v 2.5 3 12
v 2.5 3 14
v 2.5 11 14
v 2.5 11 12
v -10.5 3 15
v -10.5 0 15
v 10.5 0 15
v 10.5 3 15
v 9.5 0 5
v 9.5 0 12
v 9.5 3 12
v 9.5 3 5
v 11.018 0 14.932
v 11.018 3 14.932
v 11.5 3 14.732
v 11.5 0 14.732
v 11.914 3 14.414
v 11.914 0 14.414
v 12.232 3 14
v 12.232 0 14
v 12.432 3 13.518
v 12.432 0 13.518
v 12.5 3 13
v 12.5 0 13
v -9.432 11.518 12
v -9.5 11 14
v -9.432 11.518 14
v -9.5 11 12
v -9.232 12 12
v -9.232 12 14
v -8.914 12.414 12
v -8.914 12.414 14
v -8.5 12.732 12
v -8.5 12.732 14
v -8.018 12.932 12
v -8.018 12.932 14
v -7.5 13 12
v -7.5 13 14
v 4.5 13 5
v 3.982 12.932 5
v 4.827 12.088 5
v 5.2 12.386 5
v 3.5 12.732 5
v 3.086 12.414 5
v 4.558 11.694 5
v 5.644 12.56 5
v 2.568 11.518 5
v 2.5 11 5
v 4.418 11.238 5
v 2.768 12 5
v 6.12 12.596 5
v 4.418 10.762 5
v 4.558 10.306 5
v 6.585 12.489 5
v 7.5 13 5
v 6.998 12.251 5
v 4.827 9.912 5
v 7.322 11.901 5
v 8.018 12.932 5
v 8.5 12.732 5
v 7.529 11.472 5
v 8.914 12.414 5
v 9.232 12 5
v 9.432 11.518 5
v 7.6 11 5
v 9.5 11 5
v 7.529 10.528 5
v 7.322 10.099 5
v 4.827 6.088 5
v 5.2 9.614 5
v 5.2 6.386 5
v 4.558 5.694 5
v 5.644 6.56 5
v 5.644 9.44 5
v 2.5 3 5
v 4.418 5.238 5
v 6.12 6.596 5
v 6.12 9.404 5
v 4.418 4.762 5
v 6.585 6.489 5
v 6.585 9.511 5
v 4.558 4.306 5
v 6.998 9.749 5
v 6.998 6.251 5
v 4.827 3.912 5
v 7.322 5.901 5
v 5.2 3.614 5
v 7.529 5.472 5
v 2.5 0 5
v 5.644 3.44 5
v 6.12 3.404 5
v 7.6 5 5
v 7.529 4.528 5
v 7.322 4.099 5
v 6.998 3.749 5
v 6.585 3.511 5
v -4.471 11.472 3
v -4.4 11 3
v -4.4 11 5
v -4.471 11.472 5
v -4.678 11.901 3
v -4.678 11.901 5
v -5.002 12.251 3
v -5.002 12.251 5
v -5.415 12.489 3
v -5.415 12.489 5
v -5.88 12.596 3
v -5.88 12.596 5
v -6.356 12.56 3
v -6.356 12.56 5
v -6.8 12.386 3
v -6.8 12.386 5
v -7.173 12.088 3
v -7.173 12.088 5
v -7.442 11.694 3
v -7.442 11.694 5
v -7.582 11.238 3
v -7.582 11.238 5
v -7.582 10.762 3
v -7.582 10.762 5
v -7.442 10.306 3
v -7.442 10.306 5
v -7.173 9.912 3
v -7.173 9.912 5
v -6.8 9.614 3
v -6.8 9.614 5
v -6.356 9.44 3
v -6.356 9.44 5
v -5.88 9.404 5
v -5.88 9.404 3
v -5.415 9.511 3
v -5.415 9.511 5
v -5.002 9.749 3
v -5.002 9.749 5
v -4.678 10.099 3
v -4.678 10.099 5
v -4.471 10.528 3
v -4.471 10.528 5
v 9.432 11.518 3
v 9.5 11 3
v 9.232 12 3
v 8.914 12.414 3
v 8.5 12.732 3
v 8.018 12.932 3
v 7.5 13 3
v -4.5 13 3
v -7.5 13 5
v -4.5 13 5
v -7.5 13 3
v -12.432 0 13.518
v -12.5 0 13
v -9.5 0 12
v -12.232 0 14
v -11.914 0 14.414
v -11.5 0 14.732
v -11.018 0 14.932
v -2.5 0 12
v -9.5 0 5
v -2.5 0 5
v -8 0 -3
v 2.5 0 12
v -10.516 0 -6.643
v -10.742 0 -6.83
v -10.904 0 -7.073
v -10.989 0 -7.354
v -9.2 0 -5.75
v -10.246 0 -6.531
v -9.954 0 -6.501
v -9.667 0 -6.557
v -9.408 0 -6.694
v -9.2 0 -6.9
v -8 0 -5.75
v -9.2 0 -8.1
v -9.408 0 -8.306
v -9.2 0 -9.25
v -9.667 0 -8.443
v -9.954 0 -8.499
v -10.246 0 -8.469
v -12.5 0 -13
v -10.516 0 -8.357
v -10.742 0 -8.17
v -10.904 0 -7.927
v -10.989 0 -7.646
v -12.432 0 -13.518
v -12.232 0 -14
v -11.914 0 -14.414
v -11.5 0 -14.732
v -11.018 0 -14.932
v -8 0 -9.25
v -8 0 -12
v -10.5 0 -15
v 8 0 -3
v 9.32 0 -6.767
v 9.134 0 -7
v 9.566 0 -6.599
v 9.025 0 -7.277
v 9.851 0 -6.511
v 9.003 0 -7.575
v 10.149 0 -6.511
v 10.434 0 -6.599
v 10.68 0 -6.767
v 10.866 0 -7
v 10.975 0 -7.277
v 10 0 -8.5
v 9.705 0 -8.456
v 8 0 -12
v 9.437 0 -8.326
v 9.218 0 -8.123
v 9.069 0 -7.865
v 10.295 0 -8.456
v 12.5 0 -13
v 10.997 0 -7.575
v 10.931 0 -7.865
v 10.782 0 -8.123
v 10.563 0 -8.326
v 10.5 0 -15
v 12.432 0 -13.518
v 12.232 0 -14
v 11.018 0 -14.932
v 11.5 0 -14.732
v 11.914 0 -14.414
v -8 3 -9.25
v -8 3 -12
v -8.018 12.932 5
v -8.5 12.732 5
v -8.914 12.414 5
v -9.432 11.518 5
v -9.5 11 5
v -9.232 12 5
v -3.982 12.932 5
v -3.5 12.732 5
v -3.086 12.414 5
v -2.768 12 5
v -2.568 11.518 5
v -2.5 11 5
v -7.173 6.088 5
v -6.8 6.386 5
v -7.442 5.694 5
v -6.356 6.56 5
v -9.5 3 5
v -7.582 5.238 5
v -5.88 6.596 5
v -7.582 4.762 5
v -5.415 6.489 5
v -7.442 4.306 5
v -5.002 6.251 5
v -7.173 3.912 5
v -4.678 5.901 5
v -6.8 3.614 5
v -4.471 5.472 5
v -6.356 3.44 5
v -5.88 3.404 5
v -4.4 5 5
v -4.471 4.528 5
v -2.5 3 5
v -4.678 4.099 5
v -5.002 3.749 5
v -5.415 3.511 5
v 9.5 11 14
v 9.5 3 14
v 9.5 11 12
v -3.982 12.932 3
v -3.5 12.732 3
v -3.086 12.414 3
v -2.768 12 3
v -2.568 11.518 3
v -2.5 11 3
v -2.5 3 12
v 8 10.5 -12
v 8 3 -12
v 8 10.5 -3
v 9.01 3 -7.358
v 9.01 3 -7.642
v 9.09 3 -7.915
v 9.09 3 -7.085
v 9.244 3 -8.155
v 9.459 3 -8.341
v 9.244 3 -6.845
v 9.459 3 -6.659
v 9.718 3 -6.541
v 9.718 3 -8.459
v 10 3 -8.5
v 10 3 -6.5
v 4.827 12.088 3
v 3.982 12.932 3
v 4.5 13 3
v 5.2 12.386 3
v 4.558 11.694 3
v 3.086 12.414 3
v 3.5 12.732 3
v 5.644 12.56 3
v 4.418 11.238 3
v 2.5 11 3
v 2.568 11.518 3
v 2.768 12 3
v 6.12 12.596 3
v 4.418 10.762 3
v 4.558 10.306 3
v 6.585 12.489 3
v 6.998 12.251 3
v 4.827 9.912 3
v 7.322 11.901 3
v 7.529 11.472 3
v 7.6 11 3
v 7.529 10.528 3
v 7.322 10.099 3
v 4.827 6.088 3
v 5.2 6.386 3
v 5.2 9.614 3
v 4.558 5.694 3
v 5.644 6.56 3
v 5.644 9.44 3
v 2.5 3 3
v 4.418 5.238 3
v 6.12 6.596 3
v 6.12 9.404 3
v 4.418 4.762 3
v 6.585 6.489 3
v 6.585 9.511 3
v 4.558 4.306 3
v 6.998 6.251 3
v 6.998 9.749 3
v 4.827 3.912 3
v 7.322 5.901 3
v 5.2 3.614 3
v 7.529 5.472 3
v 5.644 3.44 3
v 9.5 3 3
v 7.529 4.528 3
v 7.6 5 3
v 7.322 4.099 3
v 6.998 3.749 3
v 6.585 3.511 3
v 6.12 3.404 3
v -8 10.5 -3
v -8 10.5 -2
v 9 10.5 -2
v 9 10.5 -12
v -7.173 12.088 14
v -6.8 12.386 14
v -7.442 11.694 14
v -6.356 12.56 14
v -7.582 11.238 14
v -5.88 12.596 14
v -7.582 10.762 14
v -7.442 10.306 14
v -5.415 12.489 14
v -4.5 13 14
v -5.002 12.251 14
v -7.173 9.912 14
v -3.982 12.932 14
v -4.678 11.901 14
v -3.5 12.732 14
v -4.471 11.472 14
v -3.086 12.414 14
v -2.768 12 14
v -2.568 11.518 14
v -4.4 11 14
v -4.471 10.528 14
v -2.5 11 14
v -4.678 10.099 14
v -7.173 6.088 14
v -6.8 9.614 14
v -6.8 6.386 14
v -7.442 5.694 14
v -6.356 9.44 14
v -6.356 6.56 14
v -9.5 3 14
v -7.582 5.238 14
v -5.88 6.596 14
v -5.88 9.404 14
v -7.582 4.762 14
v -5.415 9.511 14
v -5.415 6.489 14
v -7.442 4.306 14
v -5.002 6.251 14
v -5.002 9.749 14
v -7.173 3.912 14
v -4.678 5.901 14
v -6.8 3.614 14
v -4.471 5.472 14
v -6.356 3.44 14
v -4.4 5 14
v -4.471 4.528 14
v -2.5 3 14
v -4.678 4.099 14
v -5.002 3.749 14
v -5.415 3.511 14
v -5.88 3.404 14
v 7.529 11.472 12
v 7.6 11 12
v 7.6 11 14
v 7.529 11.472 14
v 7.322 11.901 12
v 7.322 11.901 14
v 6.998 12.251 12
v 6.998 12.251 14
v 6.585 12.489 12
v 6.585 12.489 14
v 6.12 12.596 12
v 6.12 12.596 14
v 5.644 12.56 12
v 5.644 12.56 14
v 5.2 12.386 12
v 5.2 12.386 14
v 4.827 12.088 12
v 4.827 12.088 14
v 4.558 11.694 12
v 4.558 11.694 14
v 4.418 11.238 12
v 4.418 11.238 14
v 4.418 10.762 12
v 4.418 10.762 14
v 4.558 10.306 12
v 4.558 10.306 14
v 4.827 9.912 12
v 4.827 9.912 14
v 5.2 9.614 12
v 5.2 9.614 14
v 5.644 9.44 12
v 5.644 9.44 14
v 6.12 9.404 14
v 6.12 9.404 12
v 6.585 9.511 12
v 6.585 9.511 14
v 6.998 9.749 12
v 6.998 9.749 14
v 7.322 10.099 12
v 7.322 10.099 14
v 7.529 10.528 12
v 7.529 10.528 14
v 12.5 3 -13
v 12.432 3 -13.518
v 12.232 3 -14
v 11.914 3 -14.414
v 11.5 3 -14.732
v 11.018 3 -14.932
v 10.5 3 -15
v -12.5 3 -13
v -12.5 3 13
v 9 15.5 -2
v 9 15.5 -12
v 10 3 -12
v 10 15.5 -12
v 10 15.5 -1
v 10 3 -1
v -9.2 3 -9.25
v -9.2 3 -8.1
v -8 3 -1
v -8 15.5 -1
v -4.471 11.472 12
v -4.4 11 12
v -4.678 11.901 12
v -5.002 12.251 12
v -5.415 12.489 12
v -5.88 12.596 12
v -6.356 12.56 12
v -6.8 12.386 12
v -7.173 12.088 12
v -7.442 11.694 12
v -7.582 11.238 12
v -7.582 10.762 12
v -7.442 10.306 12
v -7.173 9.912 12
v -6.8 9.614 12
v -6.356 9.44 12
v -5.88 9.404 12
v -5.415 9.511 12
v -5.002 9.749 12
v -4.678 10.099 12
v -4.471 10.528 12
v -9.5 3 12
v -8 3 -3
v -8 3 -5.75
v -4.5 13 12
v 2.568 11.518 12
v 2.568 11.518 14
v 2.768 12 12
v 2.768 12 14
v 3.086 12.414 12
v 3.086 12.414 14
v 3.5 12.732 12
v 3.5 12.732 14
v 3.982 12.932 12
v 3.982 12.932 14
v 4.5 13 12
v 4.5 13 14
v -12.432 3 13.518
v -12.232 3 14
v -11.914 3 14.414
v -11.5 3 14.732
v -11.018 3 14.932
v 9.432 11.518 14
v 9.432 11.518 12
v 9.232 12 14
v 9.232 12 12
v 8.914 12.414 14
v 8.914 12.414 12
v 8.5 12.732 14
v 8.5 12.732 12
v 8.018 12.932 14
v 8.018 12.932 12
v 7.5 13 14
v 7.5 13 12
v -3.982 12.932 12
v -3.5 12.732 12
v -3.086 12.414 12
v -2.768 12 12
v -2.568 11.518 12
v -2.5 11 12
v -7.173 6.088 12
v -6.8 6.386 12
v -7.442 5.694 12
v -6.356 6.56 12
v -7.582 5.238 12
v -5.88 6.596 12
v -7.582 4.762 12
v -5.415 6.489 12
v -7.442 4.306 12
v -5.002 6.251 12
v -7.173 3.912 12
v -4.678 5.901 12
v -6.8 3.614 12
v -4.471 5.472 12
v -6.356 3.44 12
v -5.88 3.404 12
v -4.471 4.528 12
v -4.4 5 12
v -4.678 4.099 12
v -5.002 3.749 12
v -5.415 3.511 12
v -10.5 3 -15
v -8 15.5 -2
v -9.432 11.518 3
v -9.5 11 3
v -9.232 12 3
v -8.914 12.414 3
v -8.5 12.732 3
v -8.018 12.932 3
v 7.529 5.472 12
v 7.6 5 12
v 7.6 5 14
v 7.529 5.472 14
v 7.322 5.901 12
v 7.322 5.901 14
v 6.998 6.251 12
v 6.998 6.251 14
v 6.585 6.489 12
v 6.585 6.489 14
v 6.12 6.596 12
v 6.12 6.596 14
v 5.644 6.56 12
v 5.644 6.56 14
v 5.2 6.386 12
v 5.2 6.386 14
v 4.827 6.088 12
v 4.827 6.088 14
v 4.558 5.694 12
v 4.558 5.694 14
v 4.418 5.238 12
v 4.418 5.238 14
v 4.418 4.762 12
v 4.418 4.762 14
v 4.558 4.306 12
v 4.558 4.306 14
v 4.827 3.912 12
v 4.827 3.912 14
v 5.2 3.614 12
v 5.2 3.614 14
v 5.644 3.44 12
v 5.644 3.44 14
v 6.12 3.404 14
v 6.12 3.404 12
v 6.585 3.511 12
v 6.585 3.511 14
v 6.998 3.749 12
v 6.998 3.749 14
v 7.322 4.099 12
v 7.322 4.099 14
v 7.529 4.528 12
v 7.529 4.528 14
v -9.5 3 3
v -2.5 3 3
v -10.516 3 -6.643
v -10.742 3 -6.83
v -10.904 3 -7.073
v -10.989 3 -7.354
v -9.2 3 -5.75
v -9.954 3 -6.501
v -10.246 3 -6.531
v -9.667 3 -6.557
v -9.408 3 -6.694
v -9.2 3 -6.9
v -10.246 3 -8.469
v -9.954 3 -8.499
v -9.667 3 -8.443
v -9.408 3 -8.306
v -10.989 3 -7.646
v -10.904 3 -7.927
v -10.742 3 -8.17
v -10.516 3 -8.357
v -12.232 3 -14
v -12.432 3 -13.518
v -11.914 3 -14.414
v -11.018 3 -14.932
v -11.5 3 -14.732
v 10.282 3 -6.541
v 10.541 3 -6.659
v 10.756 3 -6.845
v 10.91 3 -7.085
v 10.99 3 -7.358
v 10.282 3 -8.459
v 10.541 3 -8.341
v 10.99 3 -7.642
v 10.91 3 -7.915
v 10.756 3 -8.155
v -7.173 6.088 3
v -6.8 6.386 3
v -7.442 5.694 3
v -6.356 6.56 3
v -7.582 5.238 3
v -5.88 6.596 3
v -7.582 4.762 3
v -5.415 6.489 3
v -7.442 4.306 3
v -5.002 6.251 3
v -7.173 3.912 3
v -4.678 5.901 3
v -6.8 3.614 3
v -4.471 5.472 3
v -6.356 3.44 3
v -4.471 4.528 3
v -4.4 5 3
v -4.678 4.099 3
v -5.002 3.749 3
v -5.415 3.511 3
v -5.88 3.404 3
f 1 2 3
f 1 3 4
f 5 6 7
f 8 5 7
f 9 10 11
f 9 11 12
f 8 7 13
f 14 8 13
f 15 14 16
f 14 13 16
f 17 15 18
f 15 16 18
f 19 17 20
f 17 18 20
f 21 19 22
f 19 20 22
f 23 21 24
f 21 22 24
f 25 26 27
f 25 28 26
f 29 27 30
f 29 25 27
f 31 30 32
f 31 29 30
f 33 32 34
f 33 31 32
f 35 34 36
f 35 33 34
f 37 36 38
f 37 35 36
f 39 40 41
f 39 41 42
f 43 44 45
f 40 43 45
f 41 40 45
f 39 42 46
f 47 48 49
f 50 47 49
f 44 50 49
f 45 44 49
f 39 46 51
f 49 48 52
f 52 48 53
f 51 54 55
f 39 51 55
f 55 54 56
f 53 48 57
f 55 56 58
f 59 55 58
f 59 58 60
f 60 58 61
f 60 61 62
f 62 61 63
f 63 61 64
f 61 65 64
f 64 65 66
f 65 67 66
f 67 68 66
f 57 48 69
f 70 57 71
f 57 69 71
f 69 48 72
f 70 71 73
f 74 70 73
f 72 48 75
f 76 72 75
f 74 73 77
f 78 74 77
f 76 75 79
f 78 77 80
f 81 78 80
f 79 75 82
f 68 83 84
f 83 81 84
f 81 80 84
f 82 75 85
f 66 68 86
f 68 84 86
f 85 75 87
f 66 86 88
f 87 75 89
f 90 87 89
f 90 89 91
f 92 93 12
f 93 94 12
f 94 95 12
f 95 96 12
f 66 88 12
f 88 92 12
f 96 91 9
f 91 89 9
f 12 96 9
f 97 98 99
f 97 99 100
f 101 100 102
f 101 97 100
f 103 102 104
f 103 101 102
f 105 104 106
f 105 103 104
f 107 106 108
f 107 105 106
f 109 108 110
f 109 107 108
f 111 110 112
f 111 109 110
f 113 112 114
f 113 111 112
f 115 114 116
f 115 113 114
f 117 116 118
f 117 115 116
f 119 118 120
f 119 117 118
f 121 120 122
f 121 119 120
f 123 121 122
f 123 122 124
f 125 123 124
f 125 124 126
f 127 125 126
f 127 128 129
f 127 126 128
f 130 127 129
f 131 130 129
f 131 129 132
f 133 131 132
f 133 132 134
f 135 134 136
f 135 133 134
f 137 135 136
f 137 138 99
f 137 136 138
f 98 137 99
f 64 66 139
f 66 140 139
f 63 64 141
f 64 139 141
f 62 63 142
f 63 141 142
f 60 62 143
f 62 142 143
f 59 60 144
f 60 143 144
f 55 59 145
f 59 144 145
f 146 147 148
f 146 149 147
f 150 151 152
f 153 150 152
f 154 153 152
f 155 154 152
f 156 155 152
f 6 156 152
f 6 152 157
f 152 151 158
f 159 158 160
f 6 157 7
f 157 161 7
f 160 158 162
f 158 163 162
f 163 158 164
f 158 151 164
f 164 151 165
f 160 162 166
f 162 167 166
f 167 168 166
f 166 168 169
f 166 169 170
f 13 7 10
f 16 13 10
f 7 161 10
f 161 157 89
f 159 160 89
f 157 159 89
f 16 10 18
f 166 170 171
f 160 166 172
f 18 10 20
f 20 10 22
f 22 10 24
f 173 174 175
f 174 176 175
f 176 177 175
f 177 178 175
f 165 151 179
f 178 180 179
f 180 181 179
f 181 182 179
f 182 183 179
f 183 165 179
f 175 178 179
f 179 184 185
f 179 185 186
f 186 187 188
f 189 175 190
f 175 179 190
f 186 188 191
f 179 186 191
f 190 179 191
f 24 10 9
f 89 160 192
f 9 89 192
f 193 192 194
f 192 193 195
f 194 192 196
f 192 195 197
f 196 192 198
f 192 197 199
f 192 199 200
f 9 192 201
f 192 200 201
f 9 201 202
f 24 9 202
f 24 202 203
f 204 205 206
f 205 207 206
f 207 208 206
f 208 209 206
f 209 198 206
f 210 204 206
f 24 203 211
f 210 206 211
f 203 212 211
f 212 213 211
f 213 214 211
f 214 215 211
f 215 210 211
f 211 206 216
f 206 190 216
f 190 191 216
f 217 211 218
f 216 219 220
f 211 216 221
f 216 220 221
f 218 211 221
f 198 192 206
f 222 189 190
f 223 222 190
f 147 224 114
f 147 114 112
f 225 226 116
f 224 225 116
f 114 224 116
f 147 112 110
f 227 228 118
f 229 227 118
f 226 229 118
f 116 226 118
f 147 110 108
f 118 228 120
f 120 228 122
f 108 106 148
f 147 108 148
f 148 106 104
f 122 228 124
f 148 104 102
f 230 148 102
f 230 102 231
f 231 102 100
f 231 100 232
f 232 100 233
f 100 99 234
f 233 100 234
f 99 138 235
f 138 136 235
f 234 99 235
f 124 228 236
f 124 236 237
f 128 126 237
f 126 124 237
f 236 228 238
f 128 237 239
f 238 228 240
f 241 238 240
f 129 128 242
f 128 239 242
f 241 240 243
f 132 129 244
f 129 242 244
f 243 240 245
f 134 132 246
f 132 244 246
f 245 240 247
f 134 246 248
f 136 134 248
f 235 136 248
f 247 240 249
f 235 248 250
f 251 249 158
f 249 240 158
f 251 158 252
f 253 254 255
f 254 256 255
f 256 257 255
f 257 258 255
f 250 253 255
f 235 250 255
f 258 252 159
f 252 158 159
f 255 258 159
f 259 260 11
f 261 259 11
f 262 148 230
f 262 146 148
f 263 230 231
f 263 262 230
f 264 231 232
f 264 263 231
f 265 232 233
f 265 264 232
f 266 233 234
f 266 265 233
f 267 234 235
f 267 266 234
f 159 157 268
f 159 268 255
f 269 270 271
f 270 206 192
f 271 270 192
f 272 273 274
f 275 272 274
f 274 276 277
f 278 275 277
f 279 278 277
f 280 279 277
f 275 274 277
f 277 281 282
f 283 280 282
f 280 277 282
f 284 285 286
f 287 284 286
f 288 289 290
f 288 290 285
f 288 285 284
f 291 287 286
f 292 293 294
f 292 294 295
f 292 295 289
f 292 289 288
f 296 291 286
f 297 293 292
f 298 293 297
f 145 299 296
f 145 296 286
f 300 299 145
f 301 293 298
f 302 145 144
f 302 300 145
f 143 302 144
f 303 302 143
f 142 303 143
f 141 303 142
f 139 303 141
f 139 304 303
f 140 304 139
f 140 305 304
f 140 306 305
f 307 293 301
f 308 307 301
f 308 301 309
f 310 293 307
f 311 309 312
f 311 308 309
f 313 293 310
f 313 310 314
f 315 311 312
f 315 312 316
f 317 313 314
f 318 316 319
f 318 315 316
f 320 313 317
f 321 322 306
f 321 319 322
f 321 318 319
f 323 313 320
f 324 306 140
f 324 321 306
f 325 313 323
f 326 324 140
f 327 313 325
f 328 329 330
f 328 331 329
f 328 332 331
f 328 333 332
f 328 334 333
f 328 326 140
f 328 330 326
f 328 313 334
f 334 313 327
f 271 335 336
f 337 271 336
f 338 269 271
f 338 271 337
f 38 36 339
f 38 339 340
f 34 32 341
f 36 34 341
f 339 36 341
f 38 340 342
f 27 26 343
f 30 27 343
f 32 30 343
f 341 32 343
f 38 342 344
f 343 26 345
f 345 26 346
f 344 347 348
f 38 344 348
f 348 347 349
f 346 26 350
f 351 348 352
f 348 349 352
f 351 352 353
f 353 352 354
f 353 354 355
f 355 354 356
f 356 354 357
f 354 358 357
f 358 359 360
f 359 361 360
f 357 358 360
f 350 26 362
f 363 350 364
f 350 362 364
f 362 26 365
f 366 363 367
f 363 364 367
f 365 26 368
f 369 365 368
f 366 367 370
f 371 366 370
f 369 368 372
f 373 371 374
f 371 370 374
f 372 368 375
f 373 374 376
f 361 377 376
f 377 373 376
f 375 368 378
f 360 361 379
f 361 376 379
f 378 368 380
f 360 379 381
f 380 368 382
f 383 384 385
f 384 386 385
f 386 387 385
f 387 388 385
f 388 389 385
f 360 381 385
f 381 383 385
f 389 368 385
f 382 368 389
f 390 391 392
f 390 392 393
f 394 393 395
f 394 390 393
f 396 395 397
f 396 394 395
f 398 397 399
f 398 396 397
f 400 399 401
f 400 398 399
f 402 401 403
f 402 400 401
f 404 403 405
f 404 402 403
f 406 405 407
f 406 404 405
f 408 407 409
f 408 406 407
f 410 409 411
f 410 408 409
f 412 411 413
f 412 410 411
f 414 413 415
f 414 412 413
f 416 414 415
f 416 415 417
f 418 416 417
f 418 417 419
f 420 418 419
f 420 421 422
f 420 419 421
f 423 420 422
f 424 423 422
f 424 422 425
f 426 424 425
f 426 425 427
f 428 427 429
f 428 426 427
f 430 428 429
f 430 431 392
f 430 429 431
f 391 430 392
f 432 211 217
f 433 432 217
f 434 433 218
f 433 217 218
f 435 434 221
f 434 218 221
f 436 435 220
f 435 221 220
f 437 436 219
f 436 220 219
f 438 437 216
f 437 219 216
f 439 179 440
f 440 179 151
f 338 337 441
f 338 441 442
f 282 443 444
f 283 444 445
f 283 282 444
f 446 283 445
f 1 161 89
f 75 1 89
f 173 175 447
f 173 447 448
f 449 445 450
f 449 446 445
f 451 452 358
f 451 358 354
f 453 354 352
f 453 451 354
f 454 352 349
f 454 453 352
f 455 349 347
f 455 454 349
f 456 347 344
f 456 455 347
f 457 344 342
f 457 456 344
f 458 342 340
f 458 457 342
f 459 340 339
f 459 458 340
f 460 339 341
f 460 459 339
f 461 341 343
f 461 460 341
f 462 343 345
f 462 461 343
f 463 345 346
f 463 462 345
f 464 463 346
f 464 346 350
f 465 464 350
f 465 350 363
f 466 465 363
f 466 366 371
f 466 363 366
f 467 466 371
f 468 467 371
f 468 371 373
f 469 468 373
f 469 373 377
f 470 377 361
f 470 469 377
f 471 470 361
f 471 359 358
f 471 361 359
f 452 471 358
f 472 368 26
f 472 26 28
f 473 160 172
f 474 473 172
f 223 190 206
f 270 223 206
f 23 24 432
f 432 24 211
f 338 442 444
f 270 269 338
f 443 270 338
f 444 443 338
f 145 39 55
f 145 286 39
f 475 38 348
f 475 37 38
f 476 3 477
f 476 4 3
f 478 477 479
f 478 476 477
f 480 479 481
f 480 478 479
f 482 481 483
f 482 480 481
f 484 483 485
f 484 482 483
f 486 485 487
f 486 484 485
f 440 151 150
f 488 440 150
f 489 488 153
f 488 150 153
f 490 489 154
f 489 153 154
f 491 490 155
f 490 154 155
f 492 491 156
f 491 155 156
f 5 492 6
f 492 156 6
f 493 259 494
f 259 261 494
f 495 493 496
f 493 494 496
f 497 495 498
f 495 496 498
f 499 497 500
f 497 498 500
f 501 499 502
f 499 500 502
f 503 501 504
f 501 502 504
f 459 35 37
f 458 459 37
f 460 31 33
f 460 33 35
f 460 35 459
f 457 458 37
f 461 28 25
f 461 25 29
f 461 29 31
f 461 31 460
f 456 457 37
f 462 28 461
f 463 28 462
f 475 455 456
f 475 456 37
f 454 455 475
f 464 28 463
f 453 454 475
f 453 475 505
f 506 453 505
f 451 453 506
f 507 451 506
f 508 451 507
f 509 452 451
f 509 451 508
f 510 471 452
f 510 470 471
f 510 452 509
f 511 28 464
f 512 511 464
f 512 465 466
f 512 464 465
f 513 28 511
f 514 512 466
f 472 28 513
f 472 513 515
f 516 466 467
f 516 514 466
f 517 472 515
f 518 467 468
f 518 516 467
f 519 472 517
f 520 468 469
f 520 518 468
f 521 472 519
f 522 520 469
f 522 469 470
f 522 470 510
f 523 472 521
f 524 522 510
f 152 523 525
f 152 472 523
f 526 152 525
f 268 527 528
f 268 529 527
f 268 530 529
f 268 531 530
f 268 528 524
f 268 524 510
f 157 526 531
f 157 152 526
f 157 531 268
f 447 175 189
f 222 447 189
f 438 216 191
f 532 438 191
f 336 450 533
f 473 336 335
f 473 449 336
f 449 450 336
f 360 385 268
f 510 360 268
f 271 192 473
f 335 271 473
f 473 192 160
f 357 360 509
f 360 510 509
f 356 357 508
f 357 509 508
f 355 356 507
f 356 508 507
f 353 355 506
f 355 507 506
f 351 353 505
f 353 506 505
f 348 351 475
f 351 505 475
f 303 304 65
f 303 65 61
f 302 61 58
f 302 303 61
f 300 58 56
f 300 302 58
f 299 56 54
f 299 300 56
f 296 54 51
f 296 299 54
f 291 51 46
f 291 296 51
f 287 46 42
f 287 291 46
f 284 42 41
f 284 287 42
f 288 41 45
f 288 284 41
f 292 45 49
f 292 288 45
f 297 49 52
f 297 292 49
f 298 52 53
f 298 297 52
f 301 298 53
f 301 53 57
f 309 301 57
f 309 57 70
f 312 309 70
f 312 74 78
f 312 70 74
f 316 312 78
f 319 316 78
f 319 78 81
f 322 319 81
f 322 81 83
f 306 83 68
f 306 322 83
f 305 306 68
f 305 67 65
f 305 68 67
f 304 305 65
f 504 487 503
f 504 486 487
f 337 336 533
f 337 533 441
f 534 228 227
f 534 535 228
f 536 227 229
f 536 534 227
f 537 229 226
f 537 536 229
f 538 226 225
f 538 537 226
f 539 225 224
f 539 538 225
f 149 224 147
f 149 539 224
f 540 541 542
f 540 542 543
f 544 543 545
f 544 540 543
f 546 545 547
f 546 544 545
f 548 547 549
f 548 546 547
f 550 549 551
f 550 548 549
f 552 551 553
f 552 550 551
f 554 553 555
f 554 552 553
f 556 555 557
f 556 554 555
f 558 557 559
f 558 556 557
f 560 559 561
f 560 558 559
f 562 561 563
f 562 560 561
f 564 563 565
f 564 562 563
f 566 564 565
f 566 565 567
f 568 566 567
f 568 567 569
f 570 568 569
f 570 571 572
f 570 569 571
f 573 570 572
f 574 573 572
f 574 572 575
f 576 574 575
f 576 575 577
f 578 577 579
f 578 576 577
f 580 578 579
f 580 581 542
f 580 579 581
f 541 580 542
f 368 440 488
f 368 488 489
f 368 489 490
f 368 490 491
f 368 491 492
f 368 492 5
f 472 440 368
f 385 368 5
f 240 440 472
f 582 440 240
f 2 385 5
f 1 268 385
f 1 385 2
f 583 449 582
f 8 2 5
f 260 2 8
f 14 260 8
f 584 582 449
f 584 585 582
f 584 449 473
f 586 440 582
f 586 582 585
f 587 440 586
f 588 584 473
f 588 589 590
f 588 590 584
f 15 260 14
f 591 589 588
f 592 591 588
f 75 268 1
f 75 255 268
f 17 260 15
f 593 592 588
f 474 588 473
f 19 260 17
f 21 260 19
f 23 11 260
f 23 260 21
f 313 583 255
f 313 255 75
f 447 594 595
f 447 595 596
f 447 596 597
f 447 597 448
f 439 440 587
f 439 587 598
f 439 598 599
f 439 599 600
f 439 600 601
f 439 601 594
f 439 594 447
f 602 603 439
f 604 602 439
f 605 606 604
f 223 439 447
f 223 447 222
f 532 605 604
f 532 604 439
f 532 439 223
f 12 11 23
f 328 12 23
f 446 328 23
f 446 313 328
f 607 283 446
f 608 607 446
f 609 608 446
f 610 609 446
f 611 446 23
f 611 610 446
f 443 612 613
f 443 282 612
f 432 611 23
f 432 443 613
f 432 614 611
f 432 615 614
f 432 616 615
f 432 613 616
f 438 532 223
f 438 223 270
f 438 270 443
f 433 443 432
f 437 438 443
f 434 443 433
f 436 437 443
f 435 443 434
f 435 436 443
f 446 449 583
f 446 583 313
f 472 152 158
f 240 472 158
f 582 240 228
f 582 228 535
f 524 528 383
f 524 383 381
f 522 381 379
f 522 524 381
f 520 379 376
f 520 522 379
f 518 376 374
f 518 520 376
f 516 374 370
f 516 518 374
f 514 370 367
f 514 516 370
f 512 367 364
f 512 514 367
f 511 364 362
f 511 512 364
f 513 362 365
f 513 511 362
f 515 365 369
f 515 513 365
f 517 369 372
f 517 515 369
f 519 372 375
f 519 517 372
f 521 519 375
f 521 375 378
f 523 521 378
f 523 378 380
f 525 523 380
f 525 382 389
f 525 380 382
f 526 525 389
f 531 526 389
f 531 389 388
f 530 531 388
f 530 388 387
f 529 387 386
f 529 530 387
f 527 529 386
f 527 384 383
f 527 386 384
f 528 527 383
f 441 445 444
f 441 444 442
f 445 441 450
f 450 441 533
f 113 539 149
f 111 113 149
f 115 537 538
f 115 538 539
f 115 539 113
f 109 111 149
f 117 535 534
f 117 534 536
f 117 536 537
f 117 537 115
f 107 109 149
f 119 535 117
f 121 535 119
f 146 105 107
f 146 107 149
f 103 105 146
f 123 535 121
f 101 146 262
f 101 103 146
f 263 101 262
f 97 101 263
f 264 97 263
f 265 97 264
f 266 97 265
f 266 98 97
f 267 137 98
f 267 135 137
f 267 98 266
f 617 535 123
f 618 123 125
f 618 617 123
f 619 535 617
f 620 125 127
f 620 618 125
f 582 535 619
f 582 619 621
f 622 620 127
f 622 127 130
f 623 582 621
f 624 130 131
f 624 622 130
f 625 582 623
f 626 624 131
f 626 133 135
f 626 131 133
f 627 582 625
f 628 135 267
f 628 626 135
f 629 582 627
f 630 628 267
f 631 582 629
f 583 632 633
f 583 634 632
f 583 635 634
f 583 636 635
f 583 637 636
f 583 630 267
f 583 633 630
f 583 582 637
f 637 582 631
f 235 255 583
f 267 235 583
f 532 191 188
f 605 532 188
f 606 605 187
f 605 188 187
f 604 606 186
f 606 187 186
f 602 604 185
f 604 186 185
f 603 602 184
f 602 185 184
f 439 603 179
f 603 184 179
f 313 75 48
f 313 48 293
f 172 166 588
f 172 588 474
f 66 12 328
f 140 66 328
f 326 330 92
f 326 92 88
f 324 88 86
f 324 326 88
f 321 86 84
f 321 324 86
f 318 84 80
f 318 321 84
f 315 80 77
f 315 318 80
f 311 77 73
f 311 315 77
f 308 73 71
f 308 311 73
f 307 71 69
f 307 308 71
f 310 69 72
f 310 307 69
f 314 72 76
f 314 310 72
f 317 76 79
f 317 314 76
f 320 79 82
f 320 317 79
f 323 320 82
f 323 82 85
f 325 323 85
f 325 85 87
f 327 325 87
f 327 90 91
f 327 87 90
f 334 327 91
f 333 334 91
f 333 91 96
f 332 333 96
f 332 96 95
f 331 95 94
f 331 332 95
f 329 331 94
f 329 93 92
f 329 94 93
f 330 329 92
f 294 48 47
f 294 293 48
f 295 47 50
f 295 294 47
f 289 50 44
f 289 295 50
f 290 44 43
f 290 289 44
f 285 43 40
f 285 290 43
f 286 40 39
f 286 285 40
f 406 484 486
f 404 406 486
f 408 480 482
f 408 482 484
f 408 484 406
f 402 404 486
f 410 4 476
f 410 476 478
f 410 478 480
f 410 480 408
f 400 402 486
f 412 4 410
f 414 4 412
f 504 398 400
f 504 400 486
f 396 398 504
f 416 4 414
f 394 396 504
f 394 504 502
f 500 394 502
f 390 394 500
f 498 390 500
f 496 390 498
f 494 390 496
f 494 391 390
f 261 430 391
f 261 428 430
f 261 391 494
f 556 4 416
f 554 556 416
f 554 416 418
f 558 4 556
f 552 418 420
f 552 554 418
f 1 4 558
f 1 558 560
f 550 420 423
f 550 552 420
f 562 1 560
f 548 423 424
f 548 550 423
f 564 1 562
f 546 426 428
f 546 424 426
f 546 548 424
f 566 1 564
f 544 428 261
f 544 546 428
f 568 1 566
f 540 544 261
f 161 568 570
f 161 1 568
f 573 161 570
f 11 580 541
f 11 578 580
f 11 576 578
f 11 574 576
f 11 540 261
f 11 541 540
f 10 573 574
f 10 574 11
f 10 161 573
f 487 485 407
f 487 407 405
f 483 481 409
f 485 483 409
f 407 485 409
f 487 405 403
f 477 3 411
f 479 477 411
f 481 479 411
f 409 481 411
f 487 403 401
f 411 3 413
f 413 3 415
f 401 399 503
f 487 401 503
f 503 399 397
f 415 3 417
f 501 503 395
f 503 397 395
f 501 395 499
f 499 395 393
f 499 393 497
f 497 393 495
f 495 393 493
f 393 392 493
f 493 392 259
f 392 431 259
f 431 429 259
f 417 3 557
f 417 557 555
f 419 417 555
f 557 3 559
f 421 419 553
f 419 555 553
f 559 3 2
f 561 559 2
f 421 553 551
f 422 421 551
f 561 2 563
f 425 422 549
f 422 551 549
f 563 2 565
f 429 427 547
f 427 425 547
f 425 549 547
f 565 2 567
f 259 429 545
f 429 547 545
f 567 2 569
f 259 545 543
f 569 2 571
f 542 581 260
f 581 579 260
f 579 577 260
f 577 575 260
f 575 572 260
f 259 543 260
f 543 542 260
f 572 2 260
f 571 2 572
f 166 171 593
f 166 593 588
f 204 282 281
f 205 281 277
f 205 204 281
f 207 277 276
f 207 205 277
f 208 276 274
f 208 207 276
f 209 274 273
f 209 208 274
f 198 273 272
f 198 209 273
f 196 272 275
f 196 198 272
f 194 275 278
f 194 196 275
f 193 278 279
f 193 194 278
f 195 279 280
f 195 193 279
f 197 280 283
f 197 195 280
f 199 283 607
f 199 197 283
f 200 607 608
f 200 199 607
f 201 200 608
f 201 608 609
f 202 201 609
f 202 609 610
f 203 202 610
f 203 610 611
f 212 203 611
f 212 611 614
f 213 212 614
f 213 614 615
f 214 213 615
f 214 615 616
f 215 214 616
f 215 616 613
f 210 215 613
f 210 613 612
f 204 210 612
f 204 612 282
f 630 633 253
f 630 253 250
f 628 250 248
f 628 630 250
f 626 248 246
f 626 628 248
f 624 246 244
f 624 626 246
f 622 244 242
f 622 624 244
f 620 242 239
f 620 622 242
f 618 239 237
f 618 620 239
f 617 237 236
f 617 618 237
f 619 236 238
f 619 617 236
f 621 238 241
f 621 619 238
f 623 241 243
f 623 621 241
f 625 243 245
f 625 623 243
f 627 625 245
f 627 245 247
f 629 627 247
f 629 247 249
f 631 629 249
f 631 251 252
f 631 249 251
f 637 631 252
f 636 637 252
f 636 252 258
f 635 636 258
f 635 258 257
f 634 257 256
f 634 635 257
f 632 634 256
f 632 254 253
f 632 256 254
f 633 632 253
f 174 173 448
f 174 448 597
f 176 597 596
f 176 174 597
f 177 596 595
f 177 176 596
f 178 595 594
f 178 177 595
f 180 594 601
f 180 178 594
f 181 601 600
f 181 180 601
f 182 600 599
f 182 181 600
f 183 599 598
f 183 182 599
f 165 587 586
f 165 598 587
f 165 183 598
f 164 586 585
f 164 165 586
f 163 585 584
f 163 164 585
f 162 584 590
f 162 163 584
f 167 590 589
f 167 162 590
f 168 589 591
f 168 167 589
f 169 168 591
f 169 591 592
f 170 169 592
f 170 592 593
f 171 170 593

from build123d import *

# Parameters (mm, degrees)
SKETCH_1_R               = 1
SKETCH_1_W               = 16
SKETCH_1_H               = 9
SKETCH_1_W_2             = 7
SKETCH_1_H_2             = 7
EXTRUDE_1_DEPTH          = 3
SKETCH_2_W               = 7
SKETCH_2_H               = 2
EXTRUDE_2_DEPTH          = 10
CUT_EXTRUDE_1_DEPTH      = 35.150402633
CUT_EXTRUDE_1_DEPTH_BACK = 35.150402633
SKETCH_3_R               = 1.6
FILLET_1_R               = 2
SKETCH_4_W               = 1.2
SKETCH_4_H               = 3.5
CUT_EXTRUDE_3_DEPTH      = 10
EXTRUDE_3_DEPTH          = 7.5
EXTRUDE_6_DEPTH          = 5


with BuildPart() as part:
    # 草图1 → 凸台-拉伸1 (new body)
    with BuildSketch(Plane(origin=(0, 0, 0), x_dir=(1, 0, 0), z_dir=(0, 1, 0))):
        with BuildLine():
            Line((-10.5, -15), (10.5, -15))
            ThreePointArc((10.5, -15), (11.914213562, -14.414213562), (12.5, -13))
            Line((12.5, -13), (12.5, 13))
            ThreePointArc((12.5, 13), (11.914213562, 14.414213562), (10.5, 15))
            Line((10.5, 15), (-10.5, 15))
            ThreePointArc((-10.5, 15), (-11.914213562, 14.414213562), (-12.5, 13))
            Line((-12.5, 13), (-12.5, -13))
            ThreePointArc((-12.5, -13), (-11.914213562, -14.414213562), (-10.5, -15))
        make_face()
        with Locations(Location((-10, 7.5, 0), (0, 0, 270))):
            Circle(SKETCH_1_R, mode=Mode.SUBTRACT)
        with Locations(Location((10, 7.5, 0), (0, 0, 90))):
            Circle(SKETCH_1_R, mode=Mode.SUBTRACT)
        with Locations((0, 7.5)):
            Rectangle(SKETCH_1_W, SKETCH_1_H, mode=Mode.SUBTRACT)
        with Locations((6, -8.5)):
            Rectangle(SKETCH_1_W_2, SKETCH_1_H_2, mode=Mode.SUBTRACT)
        with Locations((-6, -8.5)):
            Rectangle(SKETCH_1_W_2, SKETCH_1_H_2, mode=Mode.SUBTRACT)
    extrude(amount=EXTRUDE_1_DEPTH)

    # 草图2 → 凸台-拉伸2 (add)
    with BuildSketch(Plane(origin=(0, 3, 0), x_dir=(1, 0, 0), z_dir=(0, 1, 0))):
        with Locations((-6, -4)):
            Rectangle(SKETCH_2_W, SKETCH_2_H)
        with Locations((-6, -13)):
            Rectangle(SKETCH_2_W, SKETCH_2_H)
        with Locations((6, -4)):
            Rectangle(SKETCH_2_W, SKETCH_2_H)
        with Locations((6, -13)):
            Rectangle(SKETCH_2_W, SKETCH_2_H)
    extrude(amount=EXTRUDE_2_DEPTH)

    # 草图3 → 切除-拉伸1 (cut, two sides: drawn at the far end of the back side and taken through both)
    with BuildSketch(Plane.XY.offset(14).offset(-CUT_EXTRUDE_1_DEPTH_BACK)):
        with Locations((-6, 11)):
            Circle(SKETCH_3_R)
        with Locations((-6, 5)):
            Circle(SKETCH_3_R)
        with Locations((6, 11)):
            Circle(SKETCH_3_R)
        with Locations((6, 5)):
            Circle(SKETCH_3_R)
    extrude(amount=CUT_EXTRUDE_1_DEPTH + CUT_EXTRUDE_1_DEPTH_BACK, mode=Mode.SUBTRACT)

    # 圆角1
    fillet_1_edges = [part.edges().sort_by_distance(p)[0] for p in [
        (2.5, 13, 4),
        (9.5, 13, 4),
        (2.5, 13, 13),
        (9.5, 13, 13),
        (-9.5, 13, 4),
        (-2.5, 13, 4),
        (-9.5, 13, 13),
        (-2.5, 13, 13),
    ]]
    fillet(fillet_1_edges, radius=FILLET_1_R)

    # 草图4 → 切除-拉伸3 (cut)
    with BuildSketch(Plane.XZ):
        with Locations((-8.6, -7.5)):
            Rectangle(SKETCH_4_W, SKETCH_4_H)
    extrude(amount=-CUT_EXTRUDE_3_DEPTH, mode=Mode.SUBTRACT)

    # 草图5 → 凸台-拉伸3 (add)
    with BuildSketch(Plane(origin=(0, 3, 0), x_dir=(1, 0, 0), z_dir=(0, 1, 0))):
        Polygon((-8, 3), (-8, 1), (10, 1), (10, 12), (8, 12), (8, 3), align=None)
    extrude(amount=EXTRUDE_3_DEPTH)

    # 草图8 → 凸台-拉伸6 (add)
    with BuildSketch(Plane(origin=(0, 10.5, 0), x_dir=(1, 0, 0), z_dir=(0, 1, 0))):
        Polygon((-8, 1), (-8, 2), (9, 2), (9, 12), (10, 12), (10, 1), align=None)
    extrude(amount=EXTRUDE_6_DEPTH)


solid = part.part
